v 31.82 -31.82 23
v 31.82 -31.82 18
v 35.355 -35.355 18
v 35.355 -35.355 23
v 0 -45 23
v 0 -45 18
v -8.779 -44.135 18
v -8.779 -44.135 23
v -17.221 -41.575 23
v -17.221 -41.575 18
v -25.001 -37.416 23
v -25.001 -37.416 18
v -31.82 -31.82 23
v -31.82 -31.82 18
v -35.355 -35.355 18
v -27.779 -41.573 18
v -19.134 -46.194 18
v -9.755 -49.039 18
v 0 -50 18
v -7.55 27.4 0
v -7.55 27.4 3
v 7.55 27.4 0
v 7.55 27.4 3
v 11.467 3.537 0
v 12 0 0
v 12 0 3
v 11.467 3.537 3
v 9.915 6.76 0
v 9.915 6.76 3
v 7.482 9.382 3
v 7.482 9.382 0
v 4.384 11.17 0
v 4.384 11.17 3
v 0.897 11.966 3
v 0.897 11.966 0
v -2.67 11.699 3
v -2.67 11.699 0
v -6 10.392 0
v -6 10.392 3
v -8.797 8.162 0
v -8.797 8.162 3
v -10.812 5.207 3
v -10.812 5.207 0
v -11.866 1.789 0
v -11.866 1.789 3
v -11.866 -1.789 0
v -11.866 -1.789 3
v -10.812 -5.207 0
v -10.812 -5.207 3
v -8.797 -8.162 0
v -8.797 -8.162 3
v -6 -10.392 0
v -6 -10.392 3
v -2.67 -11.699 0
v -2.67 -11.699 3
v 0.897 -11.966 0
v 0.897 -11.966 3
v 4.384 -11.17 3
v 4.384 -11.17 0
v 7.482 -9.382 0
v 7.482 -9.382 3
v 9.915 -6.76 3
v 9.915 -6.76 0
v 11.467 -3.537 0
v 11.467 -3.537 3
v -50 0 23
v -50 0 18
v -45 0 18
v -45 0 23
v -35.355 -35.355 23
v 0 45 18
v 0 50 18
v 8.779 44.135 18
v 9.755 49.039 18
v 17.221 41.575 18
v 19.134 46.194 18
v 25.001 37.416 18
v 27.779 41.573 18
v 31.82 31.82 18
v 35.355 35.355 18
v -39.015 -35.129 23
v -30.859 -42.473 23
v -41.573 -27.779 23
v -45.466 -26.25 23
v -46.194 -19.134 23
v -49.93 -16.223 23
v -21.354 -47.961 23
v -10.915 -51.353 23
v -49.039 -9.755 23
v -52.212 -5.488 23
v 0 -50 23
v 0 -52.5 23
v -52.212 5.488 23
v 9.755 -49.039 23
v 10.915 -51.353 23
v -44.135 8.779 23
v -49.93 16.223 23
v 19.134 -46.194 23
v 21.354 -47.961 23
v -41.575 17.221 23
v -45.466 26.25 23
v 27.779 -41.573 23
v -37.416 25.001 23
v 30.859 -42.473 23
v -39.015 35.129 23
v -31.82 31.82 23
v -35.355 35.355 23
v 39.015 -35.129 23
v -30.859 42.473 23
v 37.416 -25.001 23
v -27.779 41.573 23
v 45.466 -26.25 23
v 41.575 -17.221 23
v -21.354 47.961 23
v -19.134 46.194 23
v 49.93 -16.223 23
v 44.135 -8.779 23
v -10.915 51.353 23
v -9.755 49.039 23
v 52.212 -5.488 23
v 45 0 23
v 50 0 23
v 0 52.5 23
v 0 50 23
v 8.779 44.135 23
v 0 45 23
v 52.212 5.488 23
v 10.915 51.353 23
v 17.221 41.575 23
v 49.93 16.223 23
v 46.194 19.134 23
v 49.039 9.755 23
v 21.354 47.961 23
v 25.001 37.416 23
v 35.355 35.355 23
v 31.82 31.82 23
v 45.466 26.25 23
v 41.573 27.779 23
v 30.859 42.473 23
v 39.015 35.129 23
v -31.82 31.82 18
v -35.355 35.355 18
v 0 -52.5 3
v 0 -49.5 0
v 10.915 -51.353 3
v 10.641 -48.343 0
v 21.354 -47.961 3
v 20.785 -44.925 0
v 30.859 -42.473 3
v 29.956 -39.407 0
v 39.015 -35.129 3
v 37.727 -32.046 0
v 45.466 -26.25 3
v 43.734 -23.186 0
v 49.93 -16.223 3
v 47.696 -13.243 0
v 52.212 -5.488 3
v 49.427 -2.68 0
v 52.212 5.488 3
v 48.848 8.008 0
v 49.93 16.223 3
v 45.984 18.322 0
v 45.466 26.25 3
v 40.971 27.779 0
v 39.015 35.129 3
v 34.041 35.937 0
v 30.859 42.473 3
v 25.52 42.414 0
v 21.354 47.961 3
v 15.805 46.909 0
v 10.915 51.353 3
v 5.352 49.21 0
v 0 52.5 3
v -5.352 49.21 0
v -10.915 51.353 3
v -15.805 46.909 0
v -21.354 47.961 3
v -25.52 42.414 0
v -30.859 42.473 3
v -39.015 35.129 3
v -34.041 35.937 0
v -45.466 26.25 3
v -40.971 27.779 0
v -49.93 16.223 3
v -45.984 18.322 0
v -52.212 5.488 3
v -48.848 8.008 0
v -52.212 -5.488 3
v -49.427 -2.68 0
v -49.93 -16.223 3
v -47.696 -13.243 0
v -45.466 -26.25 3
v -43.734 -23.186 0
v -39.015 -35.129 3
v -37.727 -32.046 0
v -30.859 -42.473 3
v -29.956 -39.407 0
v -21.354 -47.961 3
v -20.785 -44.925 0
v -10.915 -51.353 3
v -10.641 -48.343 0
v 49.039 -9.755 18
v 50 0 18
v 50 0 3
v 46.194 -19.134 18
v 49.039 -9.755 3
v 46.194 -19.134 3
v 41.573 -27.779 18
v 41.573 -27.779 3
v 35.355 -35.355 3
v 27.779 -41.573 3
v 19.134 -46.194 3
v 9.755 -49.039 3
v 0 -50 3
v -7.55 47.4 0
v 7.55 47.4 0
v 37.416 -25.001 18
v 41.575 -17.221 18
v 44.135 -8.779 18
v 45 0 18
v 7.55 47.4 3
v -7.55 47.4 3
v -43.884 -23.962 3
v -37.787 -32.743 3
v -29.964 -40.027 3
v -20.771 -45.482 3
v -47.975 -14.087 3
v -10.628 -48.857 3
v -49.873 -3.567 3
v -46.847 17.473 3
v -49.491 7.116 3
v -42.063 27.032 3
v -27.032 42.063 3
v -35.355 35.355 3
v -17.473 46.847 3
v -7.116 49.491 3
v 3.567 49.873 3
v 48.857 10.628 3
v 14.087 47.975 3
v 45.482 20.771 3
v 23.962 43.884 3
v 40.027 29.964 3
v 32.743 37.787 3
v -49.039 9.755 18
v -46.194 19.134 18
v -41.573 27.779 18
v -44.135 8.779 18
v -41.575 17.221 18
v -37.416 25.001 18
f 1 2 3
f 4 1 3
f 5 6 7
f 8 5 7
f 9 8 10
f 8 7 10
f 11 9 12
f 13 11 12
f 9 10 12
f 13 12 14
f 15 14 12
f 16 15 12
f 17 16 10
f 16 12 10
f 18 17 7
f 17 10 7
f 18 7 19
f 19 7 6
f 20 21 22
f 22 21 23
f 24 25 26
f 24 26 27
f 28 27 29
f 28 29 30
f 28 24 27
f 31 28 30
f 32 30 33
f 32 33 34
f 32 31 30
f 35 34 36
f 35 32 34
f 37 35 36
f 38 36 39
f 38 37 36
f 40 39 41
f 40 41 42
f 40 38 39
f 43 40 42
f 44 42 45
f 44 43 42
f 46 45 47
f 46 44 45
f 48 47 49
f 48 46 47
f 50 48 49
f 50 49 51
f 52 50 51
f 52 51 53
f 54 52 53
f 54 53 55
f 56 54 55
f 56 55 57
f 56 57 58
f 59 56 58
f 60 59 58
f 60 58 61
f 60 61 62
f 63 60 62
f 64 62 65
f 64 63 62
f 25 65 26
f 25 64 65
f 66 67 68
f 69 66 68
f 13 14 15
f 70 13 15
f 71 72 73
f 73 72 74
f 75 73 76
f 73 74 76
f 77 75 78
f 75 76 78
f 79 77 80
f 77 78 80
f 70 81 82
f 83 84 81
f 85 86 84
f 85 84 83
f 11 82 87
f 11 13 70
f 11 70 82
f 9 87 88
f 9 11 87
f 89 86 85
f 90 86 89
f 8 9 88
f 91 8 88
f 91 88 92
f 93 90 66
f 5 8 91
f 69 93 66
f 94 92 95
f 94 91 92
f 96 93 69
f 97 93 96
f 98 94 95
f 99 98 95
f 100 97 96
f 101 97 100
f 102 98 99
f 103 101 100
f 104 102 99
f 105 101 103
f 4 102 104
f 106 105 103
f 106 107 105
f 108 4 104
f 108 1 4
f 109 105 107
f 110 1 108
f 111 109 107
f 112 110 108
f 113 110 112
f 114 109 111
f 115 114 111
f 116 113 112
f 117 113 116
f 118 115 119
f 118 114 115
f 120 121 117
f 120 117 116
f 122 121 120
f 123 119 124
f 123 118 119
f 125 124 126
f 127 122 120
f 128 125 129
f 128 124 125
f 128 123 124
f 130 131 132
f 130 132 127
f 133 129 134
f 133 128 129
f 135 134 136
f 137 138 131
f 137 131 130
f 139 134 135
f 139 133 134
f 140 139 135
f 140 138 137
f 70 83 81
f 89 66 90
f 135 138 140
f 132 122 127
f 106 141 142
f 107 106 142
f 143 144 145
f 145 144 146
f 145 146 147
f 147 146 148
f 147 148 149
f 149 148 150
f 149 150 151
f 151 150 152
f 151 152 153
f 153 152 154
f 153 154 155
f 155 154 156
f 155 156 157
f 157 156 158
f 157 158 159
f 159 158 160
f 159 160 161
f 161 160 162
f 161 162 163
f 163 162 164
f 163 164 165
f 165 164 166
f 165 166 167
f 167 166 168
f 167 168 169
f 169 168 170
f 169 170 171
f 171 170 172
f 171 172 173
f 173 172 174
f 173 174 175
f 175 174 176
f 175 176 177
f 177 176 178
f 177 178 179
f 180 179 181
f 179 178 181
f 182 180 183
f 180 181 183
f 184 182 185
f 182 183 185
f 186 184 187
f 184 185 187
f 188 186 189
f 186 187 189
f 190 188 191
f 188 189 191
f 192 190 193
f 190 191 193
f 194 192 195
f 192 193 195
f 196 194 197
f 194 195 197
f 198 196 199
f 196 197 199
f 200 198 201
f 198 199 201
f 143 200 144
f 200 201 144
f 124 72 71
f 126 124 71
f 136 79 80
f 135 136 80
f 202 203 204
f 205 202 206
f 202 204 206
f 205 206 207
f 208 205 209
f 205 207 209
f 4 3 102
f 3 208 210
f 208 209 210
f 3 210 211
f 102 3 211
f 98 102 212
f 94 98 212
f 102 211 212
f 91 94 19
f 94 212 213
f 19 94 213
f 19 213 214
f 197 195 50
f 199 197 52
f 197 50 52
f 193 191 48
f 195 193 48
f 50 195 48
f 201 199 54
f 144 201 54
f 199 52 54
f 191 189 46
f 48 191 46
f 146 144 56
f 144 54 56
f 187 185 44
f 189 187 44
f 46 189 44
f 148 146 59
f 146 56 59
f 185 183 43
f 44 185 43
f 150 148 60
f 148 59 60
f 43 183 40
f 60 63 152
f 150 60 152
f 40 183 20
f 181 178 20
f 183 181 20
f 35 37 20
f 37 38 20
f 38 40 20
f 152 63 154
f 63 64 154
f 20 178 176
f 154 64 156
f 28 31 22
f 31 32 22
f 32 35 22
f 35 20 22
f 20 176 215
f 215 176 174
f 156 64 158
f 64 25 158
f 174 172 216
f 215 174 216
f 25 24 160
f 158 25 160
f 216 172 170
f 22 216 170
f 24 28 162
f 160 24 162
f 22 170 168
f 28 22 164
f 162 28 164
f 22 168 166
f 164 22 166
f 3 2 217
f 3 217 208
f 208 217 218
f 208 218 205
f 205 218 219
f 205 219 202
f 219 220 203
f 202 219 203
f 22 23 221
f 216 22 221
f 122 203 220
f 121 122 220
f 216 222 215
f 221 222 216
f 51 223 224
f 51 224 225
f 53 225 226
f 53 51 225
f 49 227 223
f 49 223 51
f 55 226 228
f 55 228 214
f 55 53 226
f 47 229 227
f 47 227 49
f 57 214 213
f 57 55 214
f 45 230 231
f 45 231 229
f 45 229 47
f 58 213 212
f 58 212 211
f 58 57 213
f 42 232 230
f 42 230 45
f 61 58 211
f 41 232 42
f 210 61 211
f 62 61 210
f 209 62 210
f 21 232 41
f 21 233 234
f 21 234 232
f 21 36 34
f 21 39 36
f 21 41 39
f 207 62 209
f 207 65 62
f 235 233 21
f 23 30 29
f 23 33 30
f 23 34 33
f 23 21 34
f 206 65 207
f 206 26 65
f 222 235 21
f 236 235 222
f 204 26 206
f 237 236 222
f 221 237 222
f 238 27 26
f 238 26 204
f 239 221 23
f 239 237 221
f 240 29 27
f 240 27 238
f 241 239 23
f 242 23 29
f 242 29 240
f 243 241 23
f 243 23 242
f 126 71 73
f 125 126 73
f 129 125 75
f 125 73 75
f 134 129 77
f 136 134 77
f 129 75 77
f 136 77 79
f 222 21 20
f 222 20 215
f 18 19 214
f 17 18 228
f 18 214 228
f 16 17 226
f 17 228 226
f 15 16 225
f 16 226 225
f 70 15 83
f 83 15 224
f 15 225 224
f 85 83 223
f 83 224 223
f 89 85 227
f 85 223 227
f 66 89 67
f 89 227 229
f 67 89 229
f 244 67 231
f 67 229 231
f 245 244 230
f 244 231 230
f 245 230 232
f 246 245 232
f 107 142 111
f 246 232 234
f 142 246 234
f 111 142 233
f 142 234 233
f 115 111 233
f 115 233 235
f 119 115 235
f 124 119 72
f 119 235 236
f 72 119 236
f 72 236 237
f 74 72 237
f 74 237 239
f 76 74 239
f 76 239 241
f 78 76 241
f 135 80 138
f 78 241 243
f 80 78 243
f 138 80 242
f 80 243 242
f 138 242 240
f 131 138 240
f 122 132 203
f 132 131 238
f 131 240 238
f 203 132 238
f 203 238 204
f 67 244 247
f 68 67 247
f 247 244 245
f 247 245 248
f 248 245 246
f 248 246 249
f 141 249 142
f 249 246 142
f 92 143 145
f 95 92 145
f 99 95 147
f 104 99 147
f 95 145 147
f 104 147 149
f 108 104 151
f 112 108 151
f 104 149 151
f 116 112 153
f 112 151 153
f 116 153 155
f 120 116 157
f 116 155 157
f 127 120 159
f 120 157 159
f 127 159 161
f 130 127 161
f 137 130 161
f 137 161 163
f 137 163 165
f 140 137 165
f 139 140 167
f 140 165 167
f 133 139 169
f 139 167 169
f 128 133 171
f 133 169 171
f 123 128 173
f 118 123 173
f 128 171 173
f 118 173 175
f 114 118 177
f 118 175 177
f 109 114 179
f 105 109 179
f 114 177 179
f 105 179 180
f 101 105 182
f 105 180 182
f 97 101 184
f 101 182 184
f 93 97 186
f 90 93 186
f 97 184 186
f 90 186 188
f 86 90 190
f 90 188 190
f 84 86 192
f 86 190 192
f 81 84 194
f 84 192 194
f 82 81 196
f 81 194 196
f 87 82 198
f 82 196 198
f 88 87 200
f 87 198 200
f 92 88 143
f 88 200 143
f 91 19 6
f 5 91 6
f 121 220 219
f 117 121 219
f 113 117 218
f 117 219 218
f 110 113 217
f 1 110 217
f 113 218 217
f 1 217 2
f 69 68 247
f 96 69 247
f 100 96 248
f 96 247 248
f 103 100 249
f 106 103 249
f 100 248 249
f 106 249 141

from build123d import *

# Parameters (mm, degrees)
F0_R     = 12
F1_DEPTH = 3
F2_DEPTH = 23
F4_START = 18
F4_DEPTH = 5
F5_SIZE  = 3
F6_W     = 15.1
F6_H     = 20
F7_DEPTH = 52.8


with BuildPart() as f1:
    # F0 (on Top) → F1 (new body)
    with BuildSketch(Plane.XY):
        with BuildLine():
            ThreePointArc((0, -50), (35.3553390593, -35.3553390593), (50, 0))
            ThreePointArc((50, 0), (-35.3553390593, 35.3553390593), (0, -50))
        make_face()
        Circle(F0_R, mode=Mode.SUBTRACT)
    extrude(amount=F1_DEPTH)

    # F0 (on Top) → F2 (join)
    with BuildSketch(Plane.XY):
        with BuildLine():
            ThreePointArc((52.5, 0), (-37.1231060123, 37.1231060123), (0, -52.5))
            ThreePointArc((0, -52.5), (37.1231060123, -37.1231060123), (52.5, 0))
        make_face()
        with BuildLine():
            ThreePointArc((0, -50), (-35.3553390593, 35.3553390593), (50, 0))
            ThreePointArc((50, 0), (35.3553390593, -35.3553390593), (0, -50))
        make_face(mode=Mode.SUBTRACT)
    extrude(amount=F2_DEPTH)

    # F3 (on Top) → F4 (join)
    with BuildSketch(Plane.XY.offset(F4_START)):
        with BuildLine():
            Line((31.8198051534, -31.8198051534), (35.3553390593, -35.3553390593))
            ThreePointArc((35.3553390593, -35.3553390593), (46.1939766256, -19.1341716183), (50, 0))
            Line((50, 0), (45, 0))
            ThreePointArc((45, 0), (41.574578963, -17.2207544564), (31.8198051534, -31.8198051534))
        make_face()
        with BuildLine():
            ThreePointArc((-45, 0), (-41.574578963, 17.2207544564), (-31.8198051534, 31.8198051534))
            Line((-31.8198051534, 31.8198051534), (-35.3553390593, 35.3553390593))
            ThreePointArc((-35.3553390593, 35.3553390593), (-46.1939766256, 19.1341716183), (-50, 0))
            Line((-50, 0), (-45, 0))
        make_face()
        with BuildLine():
            ThreePointArc((35.3553390593, 35.3553390593), (19.1341716183, 46.1939766256), (0, 50))
            Line((0, 50), (0, 45))
            ThreePointArc((0, 45), (17.2207544564, 41.574578963), (31.8198051534, 31.8198051534))
            Line((31.8198051534, 31.8198051534), (35.3553390593, 35.3553390593))
        make_face()
        with BuildLine():
            Line((-31.8198051534, -31.8198051534), (-35.3553390593, -35.3553390593))
            ThreePointArc((-35.3553390593, -35.3553390593), (-19.1341716183, -46.1939766256), (0, -50))
            Line((0, -50), (0, -45))
            ThreePointArc((0, -45), (-17.2207544564, -41.574578963), (-31.8198051534, -31.8198051534))
        make_face()
    extrude(amount=F4_DEPTH)

    # F5
    f5_edges = [f1.edges().sort_by_distance(p)[0] for p in [
        (0, 52.5, 0),
    ]]
    chamfer(f5_edges, length=F5_SIZE)

    # F6 (on face) → F7 (cut)
    with BuildSketch(Plane.XY.offset(3)):
        with Locations((0, 37.4)):
            Rectangle(F6_W, F6_H)
    extrude(amount=-F7_DEPTH, mode=Mode.SUBTRACT)


solid = f1.part
